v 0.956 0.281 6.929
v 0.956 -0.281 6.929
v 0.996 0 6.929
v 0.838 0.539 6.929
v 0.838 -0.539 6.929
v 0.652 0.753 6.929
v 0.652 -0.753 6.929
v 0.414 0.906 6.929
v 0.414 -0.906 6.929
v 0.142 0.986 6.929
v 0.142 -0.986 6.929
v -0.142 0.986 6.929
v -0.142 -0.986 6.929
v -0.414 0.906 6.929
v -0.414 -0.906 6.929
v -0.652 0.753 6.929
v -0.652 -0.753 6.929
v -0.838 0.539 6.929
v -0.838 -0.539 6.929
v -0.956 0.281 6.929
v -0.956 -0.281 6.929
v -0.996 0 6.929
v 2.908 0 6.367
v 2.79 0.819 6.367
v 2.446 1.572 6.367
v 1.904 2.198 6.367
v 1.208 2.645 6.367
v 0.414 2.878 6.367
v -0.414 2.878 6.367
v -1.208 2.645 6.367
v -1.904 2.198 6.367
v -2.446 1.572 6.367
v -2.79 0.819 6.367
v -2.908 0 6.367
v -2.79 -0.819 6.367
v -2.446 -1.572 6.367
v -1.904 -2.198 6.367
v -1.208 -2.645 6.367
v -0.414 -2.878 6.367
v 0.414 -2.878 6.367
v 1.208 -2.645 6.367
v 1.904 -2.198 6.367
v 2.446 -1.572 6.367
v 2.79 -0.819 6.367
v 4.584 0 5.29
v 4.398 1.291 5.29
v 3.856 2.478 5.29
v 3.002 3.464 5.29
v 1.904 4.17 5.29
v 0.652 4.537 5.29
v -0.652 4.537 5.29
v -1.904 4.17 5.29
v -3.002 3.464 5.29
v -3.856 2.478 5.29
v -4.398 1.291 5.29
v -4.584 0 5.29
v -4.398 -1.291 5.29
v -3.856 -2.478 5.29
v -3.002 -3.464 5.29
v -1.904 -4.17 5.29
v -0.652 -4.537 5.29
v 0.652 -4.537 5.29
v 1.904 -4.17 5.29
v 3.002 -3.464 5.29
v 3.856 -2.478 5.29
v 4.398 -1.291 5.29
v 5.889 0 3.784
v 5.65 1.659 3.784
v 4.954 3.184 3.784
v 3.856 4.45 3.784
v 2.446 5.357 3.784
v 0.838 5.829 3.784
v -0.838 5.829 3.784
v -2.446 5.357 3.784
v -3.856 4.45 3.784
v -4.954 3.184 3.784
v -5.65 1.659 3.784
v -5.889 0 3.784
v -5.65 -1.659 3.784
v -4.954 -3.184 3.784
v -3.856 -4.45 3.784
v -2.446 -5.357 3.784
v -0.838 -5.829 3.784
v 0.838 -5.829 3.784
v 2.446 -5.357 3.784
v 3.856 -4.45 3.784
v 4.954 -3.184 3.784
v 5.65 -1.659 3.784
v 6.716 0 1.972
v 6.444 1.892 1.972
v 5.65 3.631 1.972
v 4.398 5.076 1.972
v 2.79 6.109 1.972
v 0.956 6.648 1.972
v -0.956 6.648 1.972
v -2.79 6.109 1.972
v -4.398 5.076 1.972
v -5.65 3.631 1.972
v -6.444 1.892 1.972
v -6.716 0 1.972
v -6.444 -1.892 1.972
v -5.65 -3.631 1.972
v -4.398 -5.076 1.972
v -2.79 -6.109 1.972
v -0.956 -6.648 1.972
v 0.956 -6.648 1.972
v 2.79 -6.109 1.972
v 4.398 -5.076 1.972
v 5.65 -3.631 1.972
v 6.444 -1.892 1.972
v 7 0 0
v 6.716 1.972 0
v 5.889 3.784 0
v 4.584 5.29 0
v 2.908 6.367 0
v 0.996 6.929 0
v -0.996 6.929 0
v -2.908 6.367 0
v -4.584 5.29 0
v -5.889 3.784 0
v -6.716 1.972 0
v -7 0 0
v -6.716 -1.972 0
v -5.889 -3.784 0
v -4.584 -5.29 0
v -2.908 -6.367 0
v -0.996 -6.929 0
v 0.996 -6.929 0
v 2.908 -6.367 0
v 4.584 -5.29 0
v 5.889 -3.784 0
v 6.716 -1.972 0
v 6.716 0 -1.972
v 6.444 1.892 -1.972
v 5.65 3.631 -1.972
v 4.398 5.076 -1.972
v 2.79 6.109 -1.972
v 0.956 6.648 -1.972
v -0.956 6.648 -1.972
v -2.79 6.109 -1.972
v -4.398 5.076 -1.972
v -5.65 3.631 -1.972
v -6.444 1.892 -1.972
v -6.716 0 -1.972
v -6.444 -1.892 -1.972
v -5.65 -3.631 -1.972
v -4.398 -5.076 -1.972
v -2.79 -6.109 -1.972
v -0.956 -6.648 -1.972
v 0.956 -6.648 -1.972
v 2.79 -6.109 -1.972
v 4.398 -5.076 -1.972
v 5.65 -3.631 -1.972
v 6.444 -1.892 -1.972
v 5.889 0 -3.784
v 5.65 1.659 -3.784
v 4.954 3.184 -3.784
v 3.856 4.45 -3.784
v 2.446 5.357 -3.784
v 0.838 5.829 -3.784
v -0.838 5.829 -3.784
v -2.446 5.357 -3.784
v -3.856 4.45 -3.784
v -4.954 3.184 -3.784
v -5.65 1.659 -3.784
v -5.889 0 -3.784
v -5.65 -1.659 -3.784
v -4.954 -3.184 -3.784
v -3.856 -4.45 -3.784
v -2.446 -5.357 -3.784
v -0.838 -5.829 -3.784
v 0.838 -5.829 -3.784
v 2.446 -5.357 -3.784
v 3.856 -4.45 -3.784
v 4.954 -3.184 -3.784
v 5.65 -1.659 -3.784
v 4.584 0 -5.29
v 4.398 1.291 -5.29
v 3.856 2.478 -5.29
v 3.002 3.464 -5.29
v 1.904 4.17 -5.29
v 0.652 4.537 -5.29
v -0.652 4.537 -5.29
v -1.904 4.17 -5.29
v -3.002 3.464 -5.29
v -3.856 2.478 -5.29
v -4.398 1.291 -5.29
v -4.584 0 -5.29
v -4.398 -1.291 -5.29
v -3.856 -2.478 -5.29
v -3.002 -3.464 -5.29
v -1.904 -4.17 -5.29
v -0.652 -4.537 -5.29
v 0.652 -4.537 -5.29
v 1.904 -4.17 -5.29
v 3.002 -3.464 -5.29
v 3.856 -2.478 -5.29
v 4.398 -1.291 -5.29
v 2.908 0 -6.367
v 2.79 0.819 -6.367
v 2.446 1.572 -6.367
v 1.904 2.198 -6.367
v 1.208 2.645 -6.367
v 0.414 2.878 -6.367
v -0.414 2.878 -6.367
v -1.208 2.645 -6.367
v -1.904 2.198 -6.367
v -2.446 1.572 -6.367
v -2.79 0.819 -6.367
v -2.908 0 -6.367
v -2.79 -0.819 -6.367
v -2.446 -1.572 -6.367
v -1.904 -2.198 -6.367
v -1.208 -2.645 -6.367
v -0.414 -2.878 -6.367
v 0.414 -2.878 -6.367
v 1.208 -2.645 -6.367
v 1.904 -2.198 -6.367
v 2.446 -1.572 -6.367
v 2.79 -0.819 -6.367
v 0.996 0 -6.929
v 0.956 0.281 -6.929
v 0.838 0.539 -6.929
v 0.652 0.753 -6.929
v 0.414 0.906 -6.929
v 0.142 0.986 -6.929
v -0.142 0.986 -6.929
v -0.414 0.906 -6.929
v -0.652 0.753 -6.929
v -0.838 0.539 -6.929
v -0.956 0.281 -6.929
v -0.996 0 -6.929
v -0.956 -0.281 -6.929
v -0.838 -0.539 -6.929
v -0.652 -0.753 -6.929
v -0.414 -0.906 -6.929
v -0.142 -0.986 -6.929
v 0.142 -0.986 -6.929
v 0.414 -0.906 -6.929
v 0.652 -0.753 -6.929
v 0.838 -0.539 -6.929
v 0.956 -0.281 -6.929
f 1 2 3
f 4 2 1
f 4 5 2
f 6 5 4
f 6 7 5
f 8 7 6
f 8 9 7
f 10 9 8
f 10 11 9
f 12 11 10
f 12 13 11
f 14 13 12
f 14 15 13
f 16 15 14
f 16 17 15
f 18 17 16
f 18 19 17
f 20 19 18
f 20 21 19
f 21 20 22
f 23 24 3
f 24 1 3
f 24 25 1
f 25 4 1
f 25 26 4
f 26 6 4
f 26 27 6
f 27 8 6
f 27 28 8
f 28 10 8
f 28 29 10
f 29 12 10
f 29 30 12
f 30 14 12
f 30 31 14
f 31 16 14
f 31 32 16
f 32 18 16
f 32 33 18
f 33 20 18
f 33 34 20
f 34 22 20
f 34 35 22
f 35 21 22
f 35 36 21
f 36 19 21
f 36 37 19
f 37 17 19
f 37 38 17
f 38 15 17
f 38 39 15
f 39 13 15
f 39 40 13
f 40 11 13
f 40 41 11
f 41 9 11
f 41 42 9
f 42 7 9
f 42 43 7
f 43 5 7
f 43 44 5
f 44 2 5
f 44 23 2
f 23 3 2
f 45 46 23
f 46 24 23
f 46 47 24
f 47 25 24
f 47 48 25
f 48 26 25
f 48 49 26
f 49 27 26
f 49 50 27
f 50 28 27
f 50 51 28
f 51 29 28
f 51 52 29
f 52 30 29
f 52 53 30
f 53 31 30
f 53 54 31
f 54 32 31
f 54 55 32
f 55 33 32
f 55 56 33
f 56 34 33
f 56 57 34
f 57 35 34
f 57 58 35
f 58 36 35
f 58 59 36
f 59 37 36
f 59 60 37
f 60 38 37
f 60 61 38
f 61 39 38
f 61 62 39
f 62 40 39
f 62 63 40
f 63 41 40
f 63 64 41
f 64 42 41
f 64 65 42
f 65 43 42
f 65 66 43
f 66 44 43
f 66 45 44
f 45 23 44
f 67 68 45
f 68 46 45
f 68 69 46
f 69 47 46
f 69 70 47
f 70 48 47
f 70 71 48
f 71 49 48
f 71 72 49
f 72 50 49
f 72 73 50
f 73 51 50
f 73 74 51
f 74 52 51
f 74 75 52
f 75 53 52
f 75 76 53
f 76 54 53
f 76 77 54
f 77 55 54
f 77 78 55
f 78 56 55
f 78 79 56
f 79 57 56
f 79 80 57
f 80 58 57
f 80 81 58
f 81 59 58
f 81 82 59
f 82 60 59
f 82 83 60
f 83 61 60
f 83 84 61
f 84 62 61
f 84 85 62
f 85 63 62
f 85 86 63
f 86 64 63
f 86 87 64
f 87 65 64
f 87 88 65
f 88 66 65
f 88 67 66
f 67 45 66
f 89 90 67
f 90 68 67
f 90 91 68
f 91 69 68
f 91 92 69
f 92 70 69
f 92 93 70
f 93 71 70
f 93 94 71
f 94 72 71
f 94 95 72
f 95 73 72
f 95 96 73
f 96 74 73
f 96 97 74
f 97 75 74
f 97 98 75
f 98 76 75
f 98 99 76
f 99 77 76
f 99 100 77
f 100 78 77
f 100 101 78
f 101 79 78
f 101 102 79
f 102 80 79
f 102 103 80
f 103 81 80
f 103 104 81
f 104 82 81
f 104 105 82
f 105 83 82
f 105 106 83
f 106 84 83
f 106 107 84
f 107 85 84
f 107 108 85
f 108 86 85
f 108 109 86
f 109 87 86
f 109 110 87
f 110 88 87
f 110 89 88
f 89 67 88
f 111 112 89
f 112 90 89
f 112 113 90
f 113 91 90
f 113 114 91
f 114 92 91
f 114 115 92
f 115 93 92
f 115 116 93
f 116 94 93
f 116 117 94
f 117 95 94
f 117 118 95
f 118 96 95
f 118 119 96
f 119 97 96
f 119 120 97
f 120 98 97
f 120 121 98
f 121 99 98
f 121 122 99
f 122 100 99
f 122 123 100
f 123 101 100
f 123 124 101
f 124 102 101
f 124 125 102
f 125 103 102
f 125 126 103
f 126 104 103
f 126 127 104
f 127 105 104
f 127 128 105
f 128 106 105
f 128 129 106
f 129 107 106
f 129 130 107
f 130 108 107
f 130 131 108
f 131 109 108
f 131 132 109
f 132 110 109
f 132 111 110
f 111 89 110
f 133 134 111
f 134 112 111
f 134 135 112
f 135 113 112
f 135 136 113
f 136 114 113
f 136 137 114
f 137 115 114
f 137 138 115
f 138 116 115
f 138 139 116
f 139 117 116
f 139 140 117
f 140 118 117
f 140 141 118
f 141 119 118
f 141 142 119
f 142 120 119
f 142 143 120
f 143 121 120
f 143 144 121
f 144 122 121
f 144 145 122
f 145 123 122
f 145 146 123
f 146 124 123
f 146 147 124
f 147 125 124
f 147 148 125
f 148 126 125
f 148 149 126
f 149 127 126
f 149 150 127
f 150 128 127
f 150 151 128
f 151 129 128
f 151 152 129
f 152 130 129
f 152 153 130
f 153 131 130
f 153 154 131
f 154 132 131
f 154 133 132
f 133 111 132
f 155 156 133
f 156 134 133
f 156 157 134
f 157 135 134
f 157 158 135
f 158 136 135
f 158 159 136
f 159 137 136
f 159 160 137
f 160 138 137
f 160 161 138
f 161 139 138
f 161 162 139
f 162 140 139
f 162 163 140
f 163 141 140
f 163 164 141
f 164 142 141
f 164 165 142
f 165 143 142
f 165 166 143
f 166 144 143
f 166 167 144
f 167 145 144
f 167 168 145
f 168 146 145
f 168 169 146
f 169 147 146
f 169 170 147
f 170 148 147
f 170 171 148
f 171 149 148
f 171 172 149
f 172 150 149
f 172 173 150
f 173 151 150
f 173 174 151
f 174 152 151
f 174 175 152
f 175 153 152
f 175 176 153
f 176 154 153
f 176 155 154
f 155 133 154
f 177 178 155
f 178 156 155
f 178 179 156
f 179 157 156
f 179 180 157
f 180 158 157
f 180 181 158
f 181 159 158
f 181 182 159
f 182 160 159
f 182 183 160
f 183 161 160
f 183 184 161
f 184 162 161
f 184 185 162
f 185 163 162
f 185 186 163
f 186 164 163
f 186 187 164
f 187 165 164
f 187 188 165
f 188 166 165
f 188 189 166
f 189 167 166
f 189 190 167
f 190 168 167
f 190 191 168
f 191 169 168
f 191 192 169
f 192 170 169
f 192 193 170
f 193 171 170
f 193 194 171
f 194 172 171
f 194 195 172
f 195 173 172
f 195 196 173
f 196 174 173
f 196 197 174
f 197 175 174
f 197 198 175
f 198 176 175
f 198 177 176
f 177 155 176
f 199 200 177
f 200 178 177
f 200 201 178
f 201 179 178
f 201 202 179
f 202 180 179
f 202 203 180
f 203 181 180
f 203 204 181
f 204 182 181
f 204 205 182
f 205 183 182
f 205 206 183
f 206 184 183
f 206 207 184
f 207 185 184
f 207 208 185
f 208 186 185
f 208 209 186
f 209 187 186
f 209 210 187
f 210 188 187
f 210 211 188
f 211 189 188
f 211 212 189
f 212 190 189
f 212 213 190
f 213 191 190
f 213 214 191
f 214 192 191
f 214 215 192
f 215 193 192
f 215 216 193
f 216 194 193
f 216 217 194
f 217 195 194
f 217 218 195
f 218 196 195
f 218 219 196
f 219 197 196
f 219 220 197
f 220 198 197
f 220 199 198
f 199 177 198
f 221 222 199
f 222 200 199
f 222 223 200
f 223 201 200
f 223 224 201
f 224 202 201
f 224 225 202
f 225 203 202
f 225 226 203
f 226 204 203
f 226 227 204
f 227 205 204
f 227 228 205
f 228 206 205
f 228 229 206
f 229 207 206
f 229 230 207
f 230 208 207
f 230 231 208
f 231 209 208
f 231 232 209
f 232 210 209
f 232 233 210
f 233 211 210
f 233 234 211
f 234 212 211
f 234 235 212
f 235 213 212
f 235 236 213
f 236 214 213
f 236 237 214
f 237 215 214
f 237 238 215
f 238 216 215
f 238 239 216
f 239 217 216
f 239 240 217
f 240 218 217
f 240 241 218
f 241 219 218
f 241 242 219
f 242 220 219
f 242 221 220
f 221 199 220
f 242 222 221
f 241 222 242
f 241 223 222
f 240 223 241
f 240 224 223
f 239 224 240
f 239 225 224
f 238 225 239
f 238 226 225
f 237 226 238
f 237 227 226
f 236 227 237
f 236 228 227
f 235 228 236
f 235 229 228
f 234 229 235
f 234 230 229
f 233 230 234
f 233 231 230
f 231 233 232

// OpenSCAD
// file: ../src/cadence.scad
// as of 2019.05, OpenSCAD understands
// is_num, is_list, is_string, and, is_bool
//
// is_function is coming, but looks tricky



function _normalize_angle(a) =
  ((a >= 0 && a <= 360) ? a : _normalize_angle(a + (a < 0 ? 360 : -360)));


//
// dictionary functions

function _aaget(dict, key, default, off) =
  let (kv = dict[off])
    kv == undef ? default :
    kv[0] == key ? kv[1] :
      _aaget(dict, key, default, off + 1);

function _asget(dict, key, default, off) =
  dict[off] == undef ? default :
  dict[off] == key ? dict[off + 1] :
    _asget(dict, key, default, off + 2);

function _get(dict, key, default=undef) =
  is_string(dict[0]) ?
    _asget(dict, key, default, 0) :
    _aaget(dict, key, default, 0);

function _del(dict, key) =
  [ for (kv = dict) if (kv[0] != key) kv ];

function _put(dict, key, value) =
  concat(_del(dict, key), [ [ key, value ] ]);


function _assoc(arr, key, default, off=0) =
  let (a = arr[off])
  a == undef ? default :
  a[0] == key ? a :
  _assoc(arr, key, default, off + 1);

function _app(arr, entry) =
  concat(_del(arr, entry[0]), [ entry ]);


//
// list functions

function _idx(list, index, default=undef) =
  let (
    i = index < 0 ? len(list) + index : index,
    r = list[i]
  )
  r == undef ? default : r;

  // sublist
  //
function _slist(list, from=0, to) =
  let(
    li = len(list) - 1,
    end = (to == undef ? li : to),
    a0 = from < 0 ? li + 1 + from : from,
    a = a0 < 0 ? 0 : a0,
    z = end < 0 ? li + 1 + end : end
  )
    a > li ? [] :
    z < a ? [] :
      [ for (i = [a:z]) list[i] ];

function _reverse(list) =
  [ for (i = [ len(list) - 1 : -1 : 0 ]) list[i] ];


//
// string functions

function _sstr(s, from=0, length=undef, r="") =
  let(
    i = from < 0 ? len(s) + from : from,
    l = length == undef ? len(s) : length,
    s0 = s[i]
  )
  (s0 == undef || l < 1) ? r :
  str(r, s[i], _sstr(s, i + 1, l - 1));

function _sindex(s, s1, i=0) =
  let(
    l = len(s1),
    s0 = _sstr(s, i, l)
  )
  len(s0) < l ? undef :
  s0 == s1 ? i :
  _sindex(s, s1, i + 1);


//
// point functions

  // Accept a single angle instead of [ angle0, angle1 ]
  // 'sp' is the start point
  //
function _to_point(length, angles, sp=[ 0, 0, 0 ]) =
  let(
    as = is_num(angles) ? [ angles, 0 ] : angles,
    inclination = as[0],
    azimuth = as[1] + 90
  )
    sp + [
      length * cos(inclination) * cos(azimuth),
      length * cos(inclination) * sin(azimuth),
      length * sin(inclination) ];

function _to_spherical(point) =
  let(
    l = norm(point),
    ele = asin(point.z / l),
    dir = atan2(point.y, point.x) - 90
  )
    [ l, [ ele, dir ] ];

function _to_spherical_xyz(point) =
  let(
    l = norm(point),
    ele = asin(point.z / l),
    dir = atan2(point.y, point.x) - 90
  )
    [ l, ele, dir ];

function _to_ele_dir(point) =
  let(
    ele = asin(point.z / l),
    dir = atan2(point.y, point.x) - 90
  )
    [ ele, dir ];


function _midpoint(p0, p1, ratio=0.5) =
  let(
    s = _to_spherical(p1 - p0)
  )
    _to_point(ratio * s[0], s[1], p0);

//function _vlen(vector) =
//  sqrt(pow(vector.x, 2) + pow(vector.y, 2) + pow(vector.z, 2));
  //
  // no, use norm(vector)


// inspiration:
// https://climberg.de/post/openscad_bezier_curves_of_any_degrees

function _bezier_choose(n, k) =
  k == 0 ?  1 : (n * _bezier_choose(n - 1, k - 1)) / k;

function _bezier_point(points, t, i, c) =
  len(points) == i ?
    c :
    _bezier_point(
      points,
      t,
      i + 1,
      c +
        _bezier_choose(len(points) - 1, i) *
        pow(t, i) *
        pow(1 - t, len(points) - i - 1) * points[i]);

function _bezier_points(control_points, sample_count) =
  [ for (t = [ 0 : 1.0 / sample_count : 1 ])
    _bezier_point(control_points, t, 0, [ 0, 0, 0 ]) ];


//
// modules

module polypoints(points) {

  for (i = [ 0 : len(points) - 1 ]) {
    translate(points[i]) children(i % $children);
  }
}

module polyhulls(points) {

  for (i = [ 0 : len(points) - 2 ]) {

    hull() {
      translate(points[i]) children(i % $children);
      translate(points[i + 1]) children((i + 1) % $children);
    }
  }
}


// pineapple slice
//
module paslice(radius, depth, slice=45, radius1=0) {

  s = _normalize_angle(slice);
  r = radius;

  if (s > 0) difference() {

    cylinder(depth, r=r);

    translate([ 0, 0, -0.1 ]) cylinder(depth * 1.1, r=radius1);

    if (s != 360) {

      pas = [
        [ 0, r ], [ 0, 0 ] ];
      pbs = [
        [ r, r ], [ r, 0 ], [ r, -r ], [ 0, -r ], [ -r, -r ], [ -r, 0 ],
        [ -r, r ] ];

      t = tan(s);
      tx = t * r;
      ty = r / t;

      translate([ 0, 0, -0.1 ]) linear_extrude(depth + 0.2)
        if (s <= 45)
          polygon(concat(pas, [ [ tx, r ] ], pbs));
        else if (s <= 135)
          polygon(concat(pas, [ [ r, ty ] ], _slist(pbs, 2)));
        else if (s <= 225)
          polygon(concat(pas, [ [ -tx, -r ] ], _slist(pbs, 4)));
        else if (s <= 315)
          polygon(concat(pas, [ [ -r, -ty ] ], _slist(pbs, 6)));
        else if (s < 360)
          polygon(concat(pas, [ [ tx, r ] ]));
    }
  }
}


// dome with optional trunk_height
//
module dome(radius=-1, diameter=-1, trunk_height=0) {

  r = radius < 0 ? diameter / 2 : radius;
  th = trunk_height;

  translate([ 0, 0, th ])
    difference() {
      sphere(r=r);
      translate([ 0, 0, -r ]) cube(2 * r, center=true);
    }
  translate([ 0, 0, th / 2 ])
    cylinder(r=r, h=th, center=true);
}
// main file
//
// test_dict.scad
//
// Fri Sep 18 08:44:46 JST 2020
//

use <../src/cadence.scad>;


//
// dict

di = [ [ "a", 0 ], [ "b", 1 ], [ "c", 2 ] ];

assert(_get(di, "b") == 1);
assert(_get(di, "z") == undef);

assert(_get(di, "z", 1) == 1);
assert(_get(di, "z", undef) == undef);

assert(_del(di, "c") == [ [ "a", 0 ], [ "b", 1 ] ]);
assert(_del(di, "z") == [ [ "a", 0 ], [ "b", 1 ], [ "c", 2 ] ]);

assert(_put(di, "d", 3) == [ [ "a", 0 ], [ "b", 1 ], [ "c", 2 ], [ "d", 3 ] ]);
assert(_put(di, "a", 3) == [ [ "b", 1 ], [ "c", 2 ], [ "a", 3 ] ]);


di1 = [
  [ "to spine", 0 ],
  [ "to left elbow", [ 0, 45 ] ],
  [ "to right toe", 2 ] ];

assert(_get(di1, "to spine") == 0);
assert(_get(di1, "to spine", 1) == 0);
assert(_get(di1, "to left elbow") == [ 0, 45 ]);
assert(_get(di1, "to left elbow", 1) == [ 0, 45 ]);

di2 = [
  "to spine", 0,
  "to left elbow", [ 0, 45 ],
  "to right toe", 2 ];

assert(_get(di2, "to spine") == 0);
assert(_get(di2, "to spine", 1) == 0);
assert(_get(di2, "to left elbow") == [ 0, 45 ]);
assert(_get(di2, "to left elbow", 1) == [ 0, 45 ]);


//
// _assoc

a0 = [ [ "a", 0, 1, 2 ], [ "b", 3, 4 ], [ "a", 5, 6 ] ];

assert(_assoc(a0, "a") == [ "a", 0, 1, 2 ]);
assert(_assoc(a0, "b") == [ "b", 3, 4 ]);
assert(_assoc(a0, "c") == undef);
assert(_assoc(a0, "c", "nada") == "nada");
assert(_assoc(a0, "c", undef) == undef);

a1 = [];

assert(_assoc(a1, "c") == undef);
assert(_assoc(a1, "c", 1) == 1);
assert(_assoc(a1, "c", undef) == undef);

assert(_assoc(a1, undef) == undef);
assert(_assoc(a1, undef, undef) == undef);


//
// _app

assert(_put(a0, "a", 1) == [ [ "b", 3, 4 ], [ "a", 1 ] ]);
assert(_put(a0, "a", [ 1, 2 ]) == [ [ "b", 3, 4 ], [ "a", [ 1, 2 ] ] ]);

assert(_app(a0, [ "a", -1 ]) ==
  [ [ "b", 3, 4 ], [ "a", -1 ] ]);
assert(_app(a0, [ "c", -1 ]) ==
  [ [ "a", 0, 1, 2 ], [ "b", 3, 4 ], [ "a", 5, 6 ], [ "c", -1 ] ]);


//
// SUCCESS, green ball!

color("green") sphere(7);
